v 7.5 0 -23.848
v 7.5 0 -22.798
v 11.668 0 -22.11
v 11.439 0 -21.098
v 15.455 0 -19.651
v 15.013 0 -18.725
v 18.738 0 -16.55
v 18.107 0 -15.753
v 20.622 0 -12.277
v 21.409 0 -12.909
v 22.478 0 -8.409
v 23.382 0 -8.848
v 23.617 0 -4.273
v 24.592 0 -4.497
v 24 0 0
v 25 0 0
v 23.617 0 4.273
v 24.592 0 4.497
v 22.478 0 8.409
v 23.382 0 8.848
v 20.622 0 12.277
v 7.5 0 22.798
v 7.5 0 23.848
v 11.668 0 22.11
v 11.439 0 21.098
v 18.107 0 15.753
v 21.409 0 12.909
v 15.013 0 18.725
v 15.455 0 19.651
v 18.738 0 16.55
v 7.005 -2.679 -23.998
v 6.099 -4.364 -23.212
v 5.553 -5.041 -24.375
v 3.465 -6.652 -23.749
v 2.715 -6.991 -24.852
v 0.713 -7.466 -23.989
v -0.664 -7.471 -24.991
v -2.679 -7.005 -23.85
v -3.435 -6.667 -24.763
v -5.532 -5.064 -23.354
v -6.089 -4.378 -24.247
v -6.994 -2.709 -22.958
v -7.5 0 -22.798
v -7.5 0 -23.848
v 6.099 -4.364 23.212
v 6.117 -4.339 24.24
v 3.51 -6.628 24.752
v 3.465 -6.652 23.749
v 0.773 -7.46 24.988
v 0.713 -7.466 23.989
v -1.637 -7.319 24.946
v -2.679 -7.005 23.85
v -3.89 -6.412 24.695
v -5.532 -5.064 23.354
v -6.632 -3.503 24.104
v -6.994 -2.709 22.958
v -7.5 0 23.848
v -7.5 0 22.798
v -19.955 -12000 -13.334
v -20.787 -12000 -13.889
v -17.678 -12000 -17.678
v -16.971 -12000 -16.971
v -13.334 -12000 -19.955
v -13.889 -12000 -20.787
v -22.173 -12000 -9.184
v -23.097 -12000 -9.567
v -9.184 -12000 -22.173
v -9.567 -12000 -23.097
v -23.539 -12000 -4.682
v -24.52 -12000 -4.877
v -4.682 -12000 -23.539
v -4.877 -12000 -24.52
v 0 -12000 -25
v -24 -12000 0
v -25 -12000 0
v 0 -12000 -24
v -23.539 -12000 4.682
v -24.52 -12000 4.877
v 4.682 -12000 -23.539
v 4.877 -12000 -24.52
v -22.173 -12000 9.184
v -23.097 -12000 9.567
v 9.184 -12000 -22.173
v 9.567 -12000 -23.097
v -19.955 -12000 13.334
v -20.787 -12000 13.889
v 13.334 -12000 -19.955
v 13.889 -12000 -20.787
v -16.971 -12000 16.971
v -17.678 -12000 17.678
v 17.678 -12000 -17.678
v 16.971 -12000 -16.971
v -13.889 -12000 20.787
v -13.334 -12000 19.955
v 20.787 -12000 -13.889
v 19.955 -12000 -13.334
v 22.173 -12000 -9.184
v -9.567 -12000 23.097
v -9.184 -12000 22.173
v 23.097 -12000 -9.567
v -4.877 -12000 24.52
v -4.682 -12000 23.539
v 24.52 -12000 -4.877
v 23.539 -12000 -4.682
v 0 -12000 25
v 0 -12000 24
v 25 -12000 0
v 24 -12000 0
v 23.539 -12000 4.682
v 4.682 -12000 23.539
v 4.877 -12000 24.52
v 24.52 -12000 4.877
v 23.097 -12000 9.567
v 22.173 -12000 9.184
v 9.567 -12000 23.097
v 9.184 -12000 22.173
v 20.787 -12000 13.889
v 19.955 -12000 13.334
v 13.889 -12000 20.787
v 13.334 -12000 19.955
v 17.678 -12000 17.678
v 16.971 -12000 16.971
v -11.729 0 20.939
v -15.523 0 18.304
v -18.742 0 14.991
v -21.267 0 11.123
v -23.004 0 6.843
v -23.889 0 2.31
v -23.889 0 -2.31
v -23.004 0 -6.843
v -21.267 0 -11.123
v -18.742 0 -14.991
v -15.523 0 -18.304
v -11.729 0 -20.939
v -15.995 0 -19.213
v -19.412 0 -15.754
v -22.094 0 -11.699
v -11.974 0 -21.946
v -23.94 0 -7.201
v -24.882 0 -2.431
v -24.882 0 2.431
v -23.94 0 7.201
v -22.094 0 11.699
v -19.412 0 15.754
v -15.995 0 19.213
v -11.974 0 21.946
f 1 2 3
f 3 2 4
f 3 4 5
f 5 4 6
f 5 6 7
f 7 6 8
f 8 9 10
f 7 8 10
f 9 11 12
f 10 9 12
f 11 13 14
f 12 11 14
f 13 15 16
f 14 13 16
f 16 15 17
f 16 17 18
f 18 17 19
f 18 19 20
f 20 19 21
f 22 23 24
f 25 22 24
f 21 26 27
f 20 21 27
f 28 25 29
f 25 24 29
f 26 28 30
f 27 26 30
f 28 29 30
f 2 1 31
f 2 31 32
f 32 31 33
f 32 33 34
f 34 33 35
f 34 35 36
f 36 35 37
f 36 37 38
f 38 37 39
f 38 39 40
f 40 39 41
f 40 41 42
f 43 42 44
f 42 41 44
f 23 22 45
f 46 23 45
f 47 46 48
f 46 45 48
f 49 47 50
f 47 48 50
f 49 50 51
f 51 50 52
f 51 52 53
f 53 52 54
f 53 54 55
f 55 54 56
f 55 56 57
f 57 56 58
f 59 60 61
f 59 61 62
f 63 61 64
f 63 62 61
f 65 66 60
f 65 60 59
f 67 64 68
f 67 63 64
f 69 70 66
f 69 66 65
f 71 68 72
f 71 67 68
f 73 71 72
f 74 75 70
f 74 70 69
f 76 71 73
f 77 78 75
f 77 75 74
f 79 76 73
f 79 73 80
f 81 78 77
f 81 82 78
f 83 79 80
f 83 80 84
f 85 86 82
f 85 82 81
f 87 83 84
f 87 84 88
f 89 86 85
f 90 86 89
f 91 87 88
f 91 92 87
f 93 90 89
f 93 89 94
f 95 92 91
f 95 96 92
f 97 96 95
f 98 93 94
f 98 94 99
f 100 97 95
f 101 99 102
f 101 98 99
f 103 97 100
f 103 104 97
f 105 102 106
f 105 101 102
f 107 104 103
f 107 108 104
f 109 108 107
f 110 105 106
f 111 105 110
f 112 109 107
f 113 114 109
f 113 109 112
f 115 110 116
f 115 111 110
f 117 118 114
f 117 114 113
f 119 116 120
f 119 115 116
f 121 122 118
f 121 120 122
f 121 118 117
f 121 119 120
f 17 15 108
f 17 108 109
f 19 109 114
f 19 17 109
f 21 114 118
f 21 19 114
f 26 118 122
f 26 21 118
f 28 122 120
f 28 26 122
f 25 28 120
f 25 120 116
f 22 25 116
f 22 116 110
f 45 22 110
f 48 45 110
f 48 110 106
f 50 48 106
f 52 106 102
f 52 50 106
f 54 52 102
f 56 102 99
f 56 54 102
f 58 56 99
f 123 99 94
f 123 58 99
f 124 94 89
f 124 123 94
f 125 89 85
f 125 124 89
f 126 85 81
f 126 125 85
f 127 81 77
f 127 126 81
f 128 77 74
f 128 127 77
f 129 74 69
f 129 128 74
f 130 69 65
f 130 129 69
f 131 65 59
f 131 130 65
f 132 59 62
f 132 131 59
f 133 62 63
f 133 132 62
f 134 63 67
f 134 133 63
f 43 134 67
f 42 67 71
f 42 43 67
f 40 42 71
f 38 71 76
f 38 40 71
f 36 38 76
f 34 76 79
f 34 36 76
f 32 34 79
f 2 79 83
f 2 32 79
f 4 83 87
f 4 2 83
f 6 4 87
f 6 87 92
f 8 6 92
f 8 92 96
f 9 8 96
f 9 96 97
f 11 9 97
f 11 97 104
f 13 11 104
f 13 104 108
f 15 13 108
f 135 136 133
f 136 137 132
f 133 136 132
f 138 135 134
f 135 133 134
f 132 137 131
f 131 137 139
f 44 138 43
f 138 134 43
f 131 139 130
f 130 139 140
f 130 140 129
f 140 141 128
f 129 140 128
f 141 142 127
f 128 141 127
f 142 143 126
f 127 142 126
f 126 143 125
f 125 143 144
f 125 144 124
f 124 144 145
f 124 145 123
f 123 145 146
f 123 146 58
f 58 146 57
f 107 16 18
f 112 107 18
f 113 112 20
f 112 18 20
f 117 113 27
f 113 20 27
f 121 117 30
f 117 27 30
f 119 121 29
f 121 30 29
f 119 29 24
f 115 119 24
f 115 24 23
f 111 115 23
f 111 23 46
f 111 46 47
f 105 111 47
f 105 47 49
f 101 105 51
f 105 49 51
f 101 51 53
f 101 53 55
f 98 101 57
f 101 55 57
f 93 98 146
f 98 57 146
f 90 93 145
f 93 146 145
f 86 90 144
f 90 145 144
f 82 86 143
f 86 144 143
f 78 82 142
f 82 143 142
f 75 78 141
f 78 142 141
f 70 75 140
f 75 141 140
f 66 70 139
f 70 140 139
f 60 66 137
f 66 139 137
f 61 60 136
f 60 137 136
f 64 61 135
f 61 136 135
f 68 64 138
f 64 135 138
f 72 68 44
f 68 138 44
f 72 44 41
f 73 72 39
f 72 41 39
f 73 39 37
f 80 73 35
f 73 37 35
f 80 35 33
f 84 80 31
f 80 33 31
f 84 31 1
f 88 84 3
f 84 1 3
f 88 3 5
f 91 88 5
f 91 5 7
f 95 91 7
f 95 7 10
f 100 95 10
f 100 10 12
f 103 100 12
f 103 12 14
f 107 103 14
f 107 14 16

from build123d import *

# Parameters (mm, degrees)
F0_R     = 25
F0_R_2   = 24
F1_DEPTH = 12000
F3_D     = 15
F3_DEPTH = 25
F4_D     = 15
F4_DEPTH = 25


with BuildPart() as f1:
    # F0 (on Front) → F1 (new body)
    with BuildSketch(Plane.XZ):
        Circle(F0_R)
        Circle(F0_R_2, mode=Mode.SUBTRACT)
    extrude(amount=F1_DEPTH)

    # F3
    with Locations(Plane.XY):
        with Locations((0, 0)):
            Hole(F3_D / 2, depth=F3_DEPTH)

    # F4
    with Locations(Plane(origin=(0, 0, 0), x_dir=(1, 0, 0), z_dir=(0, 0, -1))):
        with Locations((0, 0)):
            Hole(F4_D / 2, depth=F4_DEPTH)


solid = f1.part
